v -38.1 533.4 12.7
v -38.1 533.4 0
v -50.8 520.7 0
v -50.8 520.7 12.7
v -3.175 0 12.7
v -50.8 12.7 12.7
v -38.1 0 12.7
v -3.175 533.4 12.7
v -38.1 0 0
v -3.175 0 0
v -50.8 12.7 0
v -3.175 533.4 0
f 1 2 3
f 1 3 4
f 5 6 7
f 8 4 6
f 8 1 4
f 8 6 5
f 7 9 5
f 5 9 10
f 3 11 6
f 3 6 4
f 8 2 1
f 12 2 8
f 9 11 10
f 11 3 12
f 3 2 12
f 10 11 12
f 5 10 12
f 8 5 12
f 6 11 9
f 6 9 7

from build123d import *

# Parameters (mm, degrees)
SKETCH1_W           = 47.625
SKETCH1_H           = 533.4
BOSS_EXTRUDE1_DEPTH = 12.7
CHAMFER1_SIZE       = 12.7


with BuildPart() as part:
    # Sketch1 → Boss-Extrude1 (new body)
    with BuildSketch(Plane.XY):
        with Locations((-26.9875, 266.7)):
            Rectangle(SKETCH1_W, SKETCH1_H)
    extrude(amount=BOSS_EXTRUDE1_DEPTH)

    # Chamfer1
    chamfer1_edges = [part.edges().sort_by_distance(p)[0] for p in [
        (-50.8, 533.4, 6.35),
        (-50.8, 0, 6.35),
    ]]
    chamfer(chamfer1_edges, length=CHAMFER1_SIZE)


solid = part.part
